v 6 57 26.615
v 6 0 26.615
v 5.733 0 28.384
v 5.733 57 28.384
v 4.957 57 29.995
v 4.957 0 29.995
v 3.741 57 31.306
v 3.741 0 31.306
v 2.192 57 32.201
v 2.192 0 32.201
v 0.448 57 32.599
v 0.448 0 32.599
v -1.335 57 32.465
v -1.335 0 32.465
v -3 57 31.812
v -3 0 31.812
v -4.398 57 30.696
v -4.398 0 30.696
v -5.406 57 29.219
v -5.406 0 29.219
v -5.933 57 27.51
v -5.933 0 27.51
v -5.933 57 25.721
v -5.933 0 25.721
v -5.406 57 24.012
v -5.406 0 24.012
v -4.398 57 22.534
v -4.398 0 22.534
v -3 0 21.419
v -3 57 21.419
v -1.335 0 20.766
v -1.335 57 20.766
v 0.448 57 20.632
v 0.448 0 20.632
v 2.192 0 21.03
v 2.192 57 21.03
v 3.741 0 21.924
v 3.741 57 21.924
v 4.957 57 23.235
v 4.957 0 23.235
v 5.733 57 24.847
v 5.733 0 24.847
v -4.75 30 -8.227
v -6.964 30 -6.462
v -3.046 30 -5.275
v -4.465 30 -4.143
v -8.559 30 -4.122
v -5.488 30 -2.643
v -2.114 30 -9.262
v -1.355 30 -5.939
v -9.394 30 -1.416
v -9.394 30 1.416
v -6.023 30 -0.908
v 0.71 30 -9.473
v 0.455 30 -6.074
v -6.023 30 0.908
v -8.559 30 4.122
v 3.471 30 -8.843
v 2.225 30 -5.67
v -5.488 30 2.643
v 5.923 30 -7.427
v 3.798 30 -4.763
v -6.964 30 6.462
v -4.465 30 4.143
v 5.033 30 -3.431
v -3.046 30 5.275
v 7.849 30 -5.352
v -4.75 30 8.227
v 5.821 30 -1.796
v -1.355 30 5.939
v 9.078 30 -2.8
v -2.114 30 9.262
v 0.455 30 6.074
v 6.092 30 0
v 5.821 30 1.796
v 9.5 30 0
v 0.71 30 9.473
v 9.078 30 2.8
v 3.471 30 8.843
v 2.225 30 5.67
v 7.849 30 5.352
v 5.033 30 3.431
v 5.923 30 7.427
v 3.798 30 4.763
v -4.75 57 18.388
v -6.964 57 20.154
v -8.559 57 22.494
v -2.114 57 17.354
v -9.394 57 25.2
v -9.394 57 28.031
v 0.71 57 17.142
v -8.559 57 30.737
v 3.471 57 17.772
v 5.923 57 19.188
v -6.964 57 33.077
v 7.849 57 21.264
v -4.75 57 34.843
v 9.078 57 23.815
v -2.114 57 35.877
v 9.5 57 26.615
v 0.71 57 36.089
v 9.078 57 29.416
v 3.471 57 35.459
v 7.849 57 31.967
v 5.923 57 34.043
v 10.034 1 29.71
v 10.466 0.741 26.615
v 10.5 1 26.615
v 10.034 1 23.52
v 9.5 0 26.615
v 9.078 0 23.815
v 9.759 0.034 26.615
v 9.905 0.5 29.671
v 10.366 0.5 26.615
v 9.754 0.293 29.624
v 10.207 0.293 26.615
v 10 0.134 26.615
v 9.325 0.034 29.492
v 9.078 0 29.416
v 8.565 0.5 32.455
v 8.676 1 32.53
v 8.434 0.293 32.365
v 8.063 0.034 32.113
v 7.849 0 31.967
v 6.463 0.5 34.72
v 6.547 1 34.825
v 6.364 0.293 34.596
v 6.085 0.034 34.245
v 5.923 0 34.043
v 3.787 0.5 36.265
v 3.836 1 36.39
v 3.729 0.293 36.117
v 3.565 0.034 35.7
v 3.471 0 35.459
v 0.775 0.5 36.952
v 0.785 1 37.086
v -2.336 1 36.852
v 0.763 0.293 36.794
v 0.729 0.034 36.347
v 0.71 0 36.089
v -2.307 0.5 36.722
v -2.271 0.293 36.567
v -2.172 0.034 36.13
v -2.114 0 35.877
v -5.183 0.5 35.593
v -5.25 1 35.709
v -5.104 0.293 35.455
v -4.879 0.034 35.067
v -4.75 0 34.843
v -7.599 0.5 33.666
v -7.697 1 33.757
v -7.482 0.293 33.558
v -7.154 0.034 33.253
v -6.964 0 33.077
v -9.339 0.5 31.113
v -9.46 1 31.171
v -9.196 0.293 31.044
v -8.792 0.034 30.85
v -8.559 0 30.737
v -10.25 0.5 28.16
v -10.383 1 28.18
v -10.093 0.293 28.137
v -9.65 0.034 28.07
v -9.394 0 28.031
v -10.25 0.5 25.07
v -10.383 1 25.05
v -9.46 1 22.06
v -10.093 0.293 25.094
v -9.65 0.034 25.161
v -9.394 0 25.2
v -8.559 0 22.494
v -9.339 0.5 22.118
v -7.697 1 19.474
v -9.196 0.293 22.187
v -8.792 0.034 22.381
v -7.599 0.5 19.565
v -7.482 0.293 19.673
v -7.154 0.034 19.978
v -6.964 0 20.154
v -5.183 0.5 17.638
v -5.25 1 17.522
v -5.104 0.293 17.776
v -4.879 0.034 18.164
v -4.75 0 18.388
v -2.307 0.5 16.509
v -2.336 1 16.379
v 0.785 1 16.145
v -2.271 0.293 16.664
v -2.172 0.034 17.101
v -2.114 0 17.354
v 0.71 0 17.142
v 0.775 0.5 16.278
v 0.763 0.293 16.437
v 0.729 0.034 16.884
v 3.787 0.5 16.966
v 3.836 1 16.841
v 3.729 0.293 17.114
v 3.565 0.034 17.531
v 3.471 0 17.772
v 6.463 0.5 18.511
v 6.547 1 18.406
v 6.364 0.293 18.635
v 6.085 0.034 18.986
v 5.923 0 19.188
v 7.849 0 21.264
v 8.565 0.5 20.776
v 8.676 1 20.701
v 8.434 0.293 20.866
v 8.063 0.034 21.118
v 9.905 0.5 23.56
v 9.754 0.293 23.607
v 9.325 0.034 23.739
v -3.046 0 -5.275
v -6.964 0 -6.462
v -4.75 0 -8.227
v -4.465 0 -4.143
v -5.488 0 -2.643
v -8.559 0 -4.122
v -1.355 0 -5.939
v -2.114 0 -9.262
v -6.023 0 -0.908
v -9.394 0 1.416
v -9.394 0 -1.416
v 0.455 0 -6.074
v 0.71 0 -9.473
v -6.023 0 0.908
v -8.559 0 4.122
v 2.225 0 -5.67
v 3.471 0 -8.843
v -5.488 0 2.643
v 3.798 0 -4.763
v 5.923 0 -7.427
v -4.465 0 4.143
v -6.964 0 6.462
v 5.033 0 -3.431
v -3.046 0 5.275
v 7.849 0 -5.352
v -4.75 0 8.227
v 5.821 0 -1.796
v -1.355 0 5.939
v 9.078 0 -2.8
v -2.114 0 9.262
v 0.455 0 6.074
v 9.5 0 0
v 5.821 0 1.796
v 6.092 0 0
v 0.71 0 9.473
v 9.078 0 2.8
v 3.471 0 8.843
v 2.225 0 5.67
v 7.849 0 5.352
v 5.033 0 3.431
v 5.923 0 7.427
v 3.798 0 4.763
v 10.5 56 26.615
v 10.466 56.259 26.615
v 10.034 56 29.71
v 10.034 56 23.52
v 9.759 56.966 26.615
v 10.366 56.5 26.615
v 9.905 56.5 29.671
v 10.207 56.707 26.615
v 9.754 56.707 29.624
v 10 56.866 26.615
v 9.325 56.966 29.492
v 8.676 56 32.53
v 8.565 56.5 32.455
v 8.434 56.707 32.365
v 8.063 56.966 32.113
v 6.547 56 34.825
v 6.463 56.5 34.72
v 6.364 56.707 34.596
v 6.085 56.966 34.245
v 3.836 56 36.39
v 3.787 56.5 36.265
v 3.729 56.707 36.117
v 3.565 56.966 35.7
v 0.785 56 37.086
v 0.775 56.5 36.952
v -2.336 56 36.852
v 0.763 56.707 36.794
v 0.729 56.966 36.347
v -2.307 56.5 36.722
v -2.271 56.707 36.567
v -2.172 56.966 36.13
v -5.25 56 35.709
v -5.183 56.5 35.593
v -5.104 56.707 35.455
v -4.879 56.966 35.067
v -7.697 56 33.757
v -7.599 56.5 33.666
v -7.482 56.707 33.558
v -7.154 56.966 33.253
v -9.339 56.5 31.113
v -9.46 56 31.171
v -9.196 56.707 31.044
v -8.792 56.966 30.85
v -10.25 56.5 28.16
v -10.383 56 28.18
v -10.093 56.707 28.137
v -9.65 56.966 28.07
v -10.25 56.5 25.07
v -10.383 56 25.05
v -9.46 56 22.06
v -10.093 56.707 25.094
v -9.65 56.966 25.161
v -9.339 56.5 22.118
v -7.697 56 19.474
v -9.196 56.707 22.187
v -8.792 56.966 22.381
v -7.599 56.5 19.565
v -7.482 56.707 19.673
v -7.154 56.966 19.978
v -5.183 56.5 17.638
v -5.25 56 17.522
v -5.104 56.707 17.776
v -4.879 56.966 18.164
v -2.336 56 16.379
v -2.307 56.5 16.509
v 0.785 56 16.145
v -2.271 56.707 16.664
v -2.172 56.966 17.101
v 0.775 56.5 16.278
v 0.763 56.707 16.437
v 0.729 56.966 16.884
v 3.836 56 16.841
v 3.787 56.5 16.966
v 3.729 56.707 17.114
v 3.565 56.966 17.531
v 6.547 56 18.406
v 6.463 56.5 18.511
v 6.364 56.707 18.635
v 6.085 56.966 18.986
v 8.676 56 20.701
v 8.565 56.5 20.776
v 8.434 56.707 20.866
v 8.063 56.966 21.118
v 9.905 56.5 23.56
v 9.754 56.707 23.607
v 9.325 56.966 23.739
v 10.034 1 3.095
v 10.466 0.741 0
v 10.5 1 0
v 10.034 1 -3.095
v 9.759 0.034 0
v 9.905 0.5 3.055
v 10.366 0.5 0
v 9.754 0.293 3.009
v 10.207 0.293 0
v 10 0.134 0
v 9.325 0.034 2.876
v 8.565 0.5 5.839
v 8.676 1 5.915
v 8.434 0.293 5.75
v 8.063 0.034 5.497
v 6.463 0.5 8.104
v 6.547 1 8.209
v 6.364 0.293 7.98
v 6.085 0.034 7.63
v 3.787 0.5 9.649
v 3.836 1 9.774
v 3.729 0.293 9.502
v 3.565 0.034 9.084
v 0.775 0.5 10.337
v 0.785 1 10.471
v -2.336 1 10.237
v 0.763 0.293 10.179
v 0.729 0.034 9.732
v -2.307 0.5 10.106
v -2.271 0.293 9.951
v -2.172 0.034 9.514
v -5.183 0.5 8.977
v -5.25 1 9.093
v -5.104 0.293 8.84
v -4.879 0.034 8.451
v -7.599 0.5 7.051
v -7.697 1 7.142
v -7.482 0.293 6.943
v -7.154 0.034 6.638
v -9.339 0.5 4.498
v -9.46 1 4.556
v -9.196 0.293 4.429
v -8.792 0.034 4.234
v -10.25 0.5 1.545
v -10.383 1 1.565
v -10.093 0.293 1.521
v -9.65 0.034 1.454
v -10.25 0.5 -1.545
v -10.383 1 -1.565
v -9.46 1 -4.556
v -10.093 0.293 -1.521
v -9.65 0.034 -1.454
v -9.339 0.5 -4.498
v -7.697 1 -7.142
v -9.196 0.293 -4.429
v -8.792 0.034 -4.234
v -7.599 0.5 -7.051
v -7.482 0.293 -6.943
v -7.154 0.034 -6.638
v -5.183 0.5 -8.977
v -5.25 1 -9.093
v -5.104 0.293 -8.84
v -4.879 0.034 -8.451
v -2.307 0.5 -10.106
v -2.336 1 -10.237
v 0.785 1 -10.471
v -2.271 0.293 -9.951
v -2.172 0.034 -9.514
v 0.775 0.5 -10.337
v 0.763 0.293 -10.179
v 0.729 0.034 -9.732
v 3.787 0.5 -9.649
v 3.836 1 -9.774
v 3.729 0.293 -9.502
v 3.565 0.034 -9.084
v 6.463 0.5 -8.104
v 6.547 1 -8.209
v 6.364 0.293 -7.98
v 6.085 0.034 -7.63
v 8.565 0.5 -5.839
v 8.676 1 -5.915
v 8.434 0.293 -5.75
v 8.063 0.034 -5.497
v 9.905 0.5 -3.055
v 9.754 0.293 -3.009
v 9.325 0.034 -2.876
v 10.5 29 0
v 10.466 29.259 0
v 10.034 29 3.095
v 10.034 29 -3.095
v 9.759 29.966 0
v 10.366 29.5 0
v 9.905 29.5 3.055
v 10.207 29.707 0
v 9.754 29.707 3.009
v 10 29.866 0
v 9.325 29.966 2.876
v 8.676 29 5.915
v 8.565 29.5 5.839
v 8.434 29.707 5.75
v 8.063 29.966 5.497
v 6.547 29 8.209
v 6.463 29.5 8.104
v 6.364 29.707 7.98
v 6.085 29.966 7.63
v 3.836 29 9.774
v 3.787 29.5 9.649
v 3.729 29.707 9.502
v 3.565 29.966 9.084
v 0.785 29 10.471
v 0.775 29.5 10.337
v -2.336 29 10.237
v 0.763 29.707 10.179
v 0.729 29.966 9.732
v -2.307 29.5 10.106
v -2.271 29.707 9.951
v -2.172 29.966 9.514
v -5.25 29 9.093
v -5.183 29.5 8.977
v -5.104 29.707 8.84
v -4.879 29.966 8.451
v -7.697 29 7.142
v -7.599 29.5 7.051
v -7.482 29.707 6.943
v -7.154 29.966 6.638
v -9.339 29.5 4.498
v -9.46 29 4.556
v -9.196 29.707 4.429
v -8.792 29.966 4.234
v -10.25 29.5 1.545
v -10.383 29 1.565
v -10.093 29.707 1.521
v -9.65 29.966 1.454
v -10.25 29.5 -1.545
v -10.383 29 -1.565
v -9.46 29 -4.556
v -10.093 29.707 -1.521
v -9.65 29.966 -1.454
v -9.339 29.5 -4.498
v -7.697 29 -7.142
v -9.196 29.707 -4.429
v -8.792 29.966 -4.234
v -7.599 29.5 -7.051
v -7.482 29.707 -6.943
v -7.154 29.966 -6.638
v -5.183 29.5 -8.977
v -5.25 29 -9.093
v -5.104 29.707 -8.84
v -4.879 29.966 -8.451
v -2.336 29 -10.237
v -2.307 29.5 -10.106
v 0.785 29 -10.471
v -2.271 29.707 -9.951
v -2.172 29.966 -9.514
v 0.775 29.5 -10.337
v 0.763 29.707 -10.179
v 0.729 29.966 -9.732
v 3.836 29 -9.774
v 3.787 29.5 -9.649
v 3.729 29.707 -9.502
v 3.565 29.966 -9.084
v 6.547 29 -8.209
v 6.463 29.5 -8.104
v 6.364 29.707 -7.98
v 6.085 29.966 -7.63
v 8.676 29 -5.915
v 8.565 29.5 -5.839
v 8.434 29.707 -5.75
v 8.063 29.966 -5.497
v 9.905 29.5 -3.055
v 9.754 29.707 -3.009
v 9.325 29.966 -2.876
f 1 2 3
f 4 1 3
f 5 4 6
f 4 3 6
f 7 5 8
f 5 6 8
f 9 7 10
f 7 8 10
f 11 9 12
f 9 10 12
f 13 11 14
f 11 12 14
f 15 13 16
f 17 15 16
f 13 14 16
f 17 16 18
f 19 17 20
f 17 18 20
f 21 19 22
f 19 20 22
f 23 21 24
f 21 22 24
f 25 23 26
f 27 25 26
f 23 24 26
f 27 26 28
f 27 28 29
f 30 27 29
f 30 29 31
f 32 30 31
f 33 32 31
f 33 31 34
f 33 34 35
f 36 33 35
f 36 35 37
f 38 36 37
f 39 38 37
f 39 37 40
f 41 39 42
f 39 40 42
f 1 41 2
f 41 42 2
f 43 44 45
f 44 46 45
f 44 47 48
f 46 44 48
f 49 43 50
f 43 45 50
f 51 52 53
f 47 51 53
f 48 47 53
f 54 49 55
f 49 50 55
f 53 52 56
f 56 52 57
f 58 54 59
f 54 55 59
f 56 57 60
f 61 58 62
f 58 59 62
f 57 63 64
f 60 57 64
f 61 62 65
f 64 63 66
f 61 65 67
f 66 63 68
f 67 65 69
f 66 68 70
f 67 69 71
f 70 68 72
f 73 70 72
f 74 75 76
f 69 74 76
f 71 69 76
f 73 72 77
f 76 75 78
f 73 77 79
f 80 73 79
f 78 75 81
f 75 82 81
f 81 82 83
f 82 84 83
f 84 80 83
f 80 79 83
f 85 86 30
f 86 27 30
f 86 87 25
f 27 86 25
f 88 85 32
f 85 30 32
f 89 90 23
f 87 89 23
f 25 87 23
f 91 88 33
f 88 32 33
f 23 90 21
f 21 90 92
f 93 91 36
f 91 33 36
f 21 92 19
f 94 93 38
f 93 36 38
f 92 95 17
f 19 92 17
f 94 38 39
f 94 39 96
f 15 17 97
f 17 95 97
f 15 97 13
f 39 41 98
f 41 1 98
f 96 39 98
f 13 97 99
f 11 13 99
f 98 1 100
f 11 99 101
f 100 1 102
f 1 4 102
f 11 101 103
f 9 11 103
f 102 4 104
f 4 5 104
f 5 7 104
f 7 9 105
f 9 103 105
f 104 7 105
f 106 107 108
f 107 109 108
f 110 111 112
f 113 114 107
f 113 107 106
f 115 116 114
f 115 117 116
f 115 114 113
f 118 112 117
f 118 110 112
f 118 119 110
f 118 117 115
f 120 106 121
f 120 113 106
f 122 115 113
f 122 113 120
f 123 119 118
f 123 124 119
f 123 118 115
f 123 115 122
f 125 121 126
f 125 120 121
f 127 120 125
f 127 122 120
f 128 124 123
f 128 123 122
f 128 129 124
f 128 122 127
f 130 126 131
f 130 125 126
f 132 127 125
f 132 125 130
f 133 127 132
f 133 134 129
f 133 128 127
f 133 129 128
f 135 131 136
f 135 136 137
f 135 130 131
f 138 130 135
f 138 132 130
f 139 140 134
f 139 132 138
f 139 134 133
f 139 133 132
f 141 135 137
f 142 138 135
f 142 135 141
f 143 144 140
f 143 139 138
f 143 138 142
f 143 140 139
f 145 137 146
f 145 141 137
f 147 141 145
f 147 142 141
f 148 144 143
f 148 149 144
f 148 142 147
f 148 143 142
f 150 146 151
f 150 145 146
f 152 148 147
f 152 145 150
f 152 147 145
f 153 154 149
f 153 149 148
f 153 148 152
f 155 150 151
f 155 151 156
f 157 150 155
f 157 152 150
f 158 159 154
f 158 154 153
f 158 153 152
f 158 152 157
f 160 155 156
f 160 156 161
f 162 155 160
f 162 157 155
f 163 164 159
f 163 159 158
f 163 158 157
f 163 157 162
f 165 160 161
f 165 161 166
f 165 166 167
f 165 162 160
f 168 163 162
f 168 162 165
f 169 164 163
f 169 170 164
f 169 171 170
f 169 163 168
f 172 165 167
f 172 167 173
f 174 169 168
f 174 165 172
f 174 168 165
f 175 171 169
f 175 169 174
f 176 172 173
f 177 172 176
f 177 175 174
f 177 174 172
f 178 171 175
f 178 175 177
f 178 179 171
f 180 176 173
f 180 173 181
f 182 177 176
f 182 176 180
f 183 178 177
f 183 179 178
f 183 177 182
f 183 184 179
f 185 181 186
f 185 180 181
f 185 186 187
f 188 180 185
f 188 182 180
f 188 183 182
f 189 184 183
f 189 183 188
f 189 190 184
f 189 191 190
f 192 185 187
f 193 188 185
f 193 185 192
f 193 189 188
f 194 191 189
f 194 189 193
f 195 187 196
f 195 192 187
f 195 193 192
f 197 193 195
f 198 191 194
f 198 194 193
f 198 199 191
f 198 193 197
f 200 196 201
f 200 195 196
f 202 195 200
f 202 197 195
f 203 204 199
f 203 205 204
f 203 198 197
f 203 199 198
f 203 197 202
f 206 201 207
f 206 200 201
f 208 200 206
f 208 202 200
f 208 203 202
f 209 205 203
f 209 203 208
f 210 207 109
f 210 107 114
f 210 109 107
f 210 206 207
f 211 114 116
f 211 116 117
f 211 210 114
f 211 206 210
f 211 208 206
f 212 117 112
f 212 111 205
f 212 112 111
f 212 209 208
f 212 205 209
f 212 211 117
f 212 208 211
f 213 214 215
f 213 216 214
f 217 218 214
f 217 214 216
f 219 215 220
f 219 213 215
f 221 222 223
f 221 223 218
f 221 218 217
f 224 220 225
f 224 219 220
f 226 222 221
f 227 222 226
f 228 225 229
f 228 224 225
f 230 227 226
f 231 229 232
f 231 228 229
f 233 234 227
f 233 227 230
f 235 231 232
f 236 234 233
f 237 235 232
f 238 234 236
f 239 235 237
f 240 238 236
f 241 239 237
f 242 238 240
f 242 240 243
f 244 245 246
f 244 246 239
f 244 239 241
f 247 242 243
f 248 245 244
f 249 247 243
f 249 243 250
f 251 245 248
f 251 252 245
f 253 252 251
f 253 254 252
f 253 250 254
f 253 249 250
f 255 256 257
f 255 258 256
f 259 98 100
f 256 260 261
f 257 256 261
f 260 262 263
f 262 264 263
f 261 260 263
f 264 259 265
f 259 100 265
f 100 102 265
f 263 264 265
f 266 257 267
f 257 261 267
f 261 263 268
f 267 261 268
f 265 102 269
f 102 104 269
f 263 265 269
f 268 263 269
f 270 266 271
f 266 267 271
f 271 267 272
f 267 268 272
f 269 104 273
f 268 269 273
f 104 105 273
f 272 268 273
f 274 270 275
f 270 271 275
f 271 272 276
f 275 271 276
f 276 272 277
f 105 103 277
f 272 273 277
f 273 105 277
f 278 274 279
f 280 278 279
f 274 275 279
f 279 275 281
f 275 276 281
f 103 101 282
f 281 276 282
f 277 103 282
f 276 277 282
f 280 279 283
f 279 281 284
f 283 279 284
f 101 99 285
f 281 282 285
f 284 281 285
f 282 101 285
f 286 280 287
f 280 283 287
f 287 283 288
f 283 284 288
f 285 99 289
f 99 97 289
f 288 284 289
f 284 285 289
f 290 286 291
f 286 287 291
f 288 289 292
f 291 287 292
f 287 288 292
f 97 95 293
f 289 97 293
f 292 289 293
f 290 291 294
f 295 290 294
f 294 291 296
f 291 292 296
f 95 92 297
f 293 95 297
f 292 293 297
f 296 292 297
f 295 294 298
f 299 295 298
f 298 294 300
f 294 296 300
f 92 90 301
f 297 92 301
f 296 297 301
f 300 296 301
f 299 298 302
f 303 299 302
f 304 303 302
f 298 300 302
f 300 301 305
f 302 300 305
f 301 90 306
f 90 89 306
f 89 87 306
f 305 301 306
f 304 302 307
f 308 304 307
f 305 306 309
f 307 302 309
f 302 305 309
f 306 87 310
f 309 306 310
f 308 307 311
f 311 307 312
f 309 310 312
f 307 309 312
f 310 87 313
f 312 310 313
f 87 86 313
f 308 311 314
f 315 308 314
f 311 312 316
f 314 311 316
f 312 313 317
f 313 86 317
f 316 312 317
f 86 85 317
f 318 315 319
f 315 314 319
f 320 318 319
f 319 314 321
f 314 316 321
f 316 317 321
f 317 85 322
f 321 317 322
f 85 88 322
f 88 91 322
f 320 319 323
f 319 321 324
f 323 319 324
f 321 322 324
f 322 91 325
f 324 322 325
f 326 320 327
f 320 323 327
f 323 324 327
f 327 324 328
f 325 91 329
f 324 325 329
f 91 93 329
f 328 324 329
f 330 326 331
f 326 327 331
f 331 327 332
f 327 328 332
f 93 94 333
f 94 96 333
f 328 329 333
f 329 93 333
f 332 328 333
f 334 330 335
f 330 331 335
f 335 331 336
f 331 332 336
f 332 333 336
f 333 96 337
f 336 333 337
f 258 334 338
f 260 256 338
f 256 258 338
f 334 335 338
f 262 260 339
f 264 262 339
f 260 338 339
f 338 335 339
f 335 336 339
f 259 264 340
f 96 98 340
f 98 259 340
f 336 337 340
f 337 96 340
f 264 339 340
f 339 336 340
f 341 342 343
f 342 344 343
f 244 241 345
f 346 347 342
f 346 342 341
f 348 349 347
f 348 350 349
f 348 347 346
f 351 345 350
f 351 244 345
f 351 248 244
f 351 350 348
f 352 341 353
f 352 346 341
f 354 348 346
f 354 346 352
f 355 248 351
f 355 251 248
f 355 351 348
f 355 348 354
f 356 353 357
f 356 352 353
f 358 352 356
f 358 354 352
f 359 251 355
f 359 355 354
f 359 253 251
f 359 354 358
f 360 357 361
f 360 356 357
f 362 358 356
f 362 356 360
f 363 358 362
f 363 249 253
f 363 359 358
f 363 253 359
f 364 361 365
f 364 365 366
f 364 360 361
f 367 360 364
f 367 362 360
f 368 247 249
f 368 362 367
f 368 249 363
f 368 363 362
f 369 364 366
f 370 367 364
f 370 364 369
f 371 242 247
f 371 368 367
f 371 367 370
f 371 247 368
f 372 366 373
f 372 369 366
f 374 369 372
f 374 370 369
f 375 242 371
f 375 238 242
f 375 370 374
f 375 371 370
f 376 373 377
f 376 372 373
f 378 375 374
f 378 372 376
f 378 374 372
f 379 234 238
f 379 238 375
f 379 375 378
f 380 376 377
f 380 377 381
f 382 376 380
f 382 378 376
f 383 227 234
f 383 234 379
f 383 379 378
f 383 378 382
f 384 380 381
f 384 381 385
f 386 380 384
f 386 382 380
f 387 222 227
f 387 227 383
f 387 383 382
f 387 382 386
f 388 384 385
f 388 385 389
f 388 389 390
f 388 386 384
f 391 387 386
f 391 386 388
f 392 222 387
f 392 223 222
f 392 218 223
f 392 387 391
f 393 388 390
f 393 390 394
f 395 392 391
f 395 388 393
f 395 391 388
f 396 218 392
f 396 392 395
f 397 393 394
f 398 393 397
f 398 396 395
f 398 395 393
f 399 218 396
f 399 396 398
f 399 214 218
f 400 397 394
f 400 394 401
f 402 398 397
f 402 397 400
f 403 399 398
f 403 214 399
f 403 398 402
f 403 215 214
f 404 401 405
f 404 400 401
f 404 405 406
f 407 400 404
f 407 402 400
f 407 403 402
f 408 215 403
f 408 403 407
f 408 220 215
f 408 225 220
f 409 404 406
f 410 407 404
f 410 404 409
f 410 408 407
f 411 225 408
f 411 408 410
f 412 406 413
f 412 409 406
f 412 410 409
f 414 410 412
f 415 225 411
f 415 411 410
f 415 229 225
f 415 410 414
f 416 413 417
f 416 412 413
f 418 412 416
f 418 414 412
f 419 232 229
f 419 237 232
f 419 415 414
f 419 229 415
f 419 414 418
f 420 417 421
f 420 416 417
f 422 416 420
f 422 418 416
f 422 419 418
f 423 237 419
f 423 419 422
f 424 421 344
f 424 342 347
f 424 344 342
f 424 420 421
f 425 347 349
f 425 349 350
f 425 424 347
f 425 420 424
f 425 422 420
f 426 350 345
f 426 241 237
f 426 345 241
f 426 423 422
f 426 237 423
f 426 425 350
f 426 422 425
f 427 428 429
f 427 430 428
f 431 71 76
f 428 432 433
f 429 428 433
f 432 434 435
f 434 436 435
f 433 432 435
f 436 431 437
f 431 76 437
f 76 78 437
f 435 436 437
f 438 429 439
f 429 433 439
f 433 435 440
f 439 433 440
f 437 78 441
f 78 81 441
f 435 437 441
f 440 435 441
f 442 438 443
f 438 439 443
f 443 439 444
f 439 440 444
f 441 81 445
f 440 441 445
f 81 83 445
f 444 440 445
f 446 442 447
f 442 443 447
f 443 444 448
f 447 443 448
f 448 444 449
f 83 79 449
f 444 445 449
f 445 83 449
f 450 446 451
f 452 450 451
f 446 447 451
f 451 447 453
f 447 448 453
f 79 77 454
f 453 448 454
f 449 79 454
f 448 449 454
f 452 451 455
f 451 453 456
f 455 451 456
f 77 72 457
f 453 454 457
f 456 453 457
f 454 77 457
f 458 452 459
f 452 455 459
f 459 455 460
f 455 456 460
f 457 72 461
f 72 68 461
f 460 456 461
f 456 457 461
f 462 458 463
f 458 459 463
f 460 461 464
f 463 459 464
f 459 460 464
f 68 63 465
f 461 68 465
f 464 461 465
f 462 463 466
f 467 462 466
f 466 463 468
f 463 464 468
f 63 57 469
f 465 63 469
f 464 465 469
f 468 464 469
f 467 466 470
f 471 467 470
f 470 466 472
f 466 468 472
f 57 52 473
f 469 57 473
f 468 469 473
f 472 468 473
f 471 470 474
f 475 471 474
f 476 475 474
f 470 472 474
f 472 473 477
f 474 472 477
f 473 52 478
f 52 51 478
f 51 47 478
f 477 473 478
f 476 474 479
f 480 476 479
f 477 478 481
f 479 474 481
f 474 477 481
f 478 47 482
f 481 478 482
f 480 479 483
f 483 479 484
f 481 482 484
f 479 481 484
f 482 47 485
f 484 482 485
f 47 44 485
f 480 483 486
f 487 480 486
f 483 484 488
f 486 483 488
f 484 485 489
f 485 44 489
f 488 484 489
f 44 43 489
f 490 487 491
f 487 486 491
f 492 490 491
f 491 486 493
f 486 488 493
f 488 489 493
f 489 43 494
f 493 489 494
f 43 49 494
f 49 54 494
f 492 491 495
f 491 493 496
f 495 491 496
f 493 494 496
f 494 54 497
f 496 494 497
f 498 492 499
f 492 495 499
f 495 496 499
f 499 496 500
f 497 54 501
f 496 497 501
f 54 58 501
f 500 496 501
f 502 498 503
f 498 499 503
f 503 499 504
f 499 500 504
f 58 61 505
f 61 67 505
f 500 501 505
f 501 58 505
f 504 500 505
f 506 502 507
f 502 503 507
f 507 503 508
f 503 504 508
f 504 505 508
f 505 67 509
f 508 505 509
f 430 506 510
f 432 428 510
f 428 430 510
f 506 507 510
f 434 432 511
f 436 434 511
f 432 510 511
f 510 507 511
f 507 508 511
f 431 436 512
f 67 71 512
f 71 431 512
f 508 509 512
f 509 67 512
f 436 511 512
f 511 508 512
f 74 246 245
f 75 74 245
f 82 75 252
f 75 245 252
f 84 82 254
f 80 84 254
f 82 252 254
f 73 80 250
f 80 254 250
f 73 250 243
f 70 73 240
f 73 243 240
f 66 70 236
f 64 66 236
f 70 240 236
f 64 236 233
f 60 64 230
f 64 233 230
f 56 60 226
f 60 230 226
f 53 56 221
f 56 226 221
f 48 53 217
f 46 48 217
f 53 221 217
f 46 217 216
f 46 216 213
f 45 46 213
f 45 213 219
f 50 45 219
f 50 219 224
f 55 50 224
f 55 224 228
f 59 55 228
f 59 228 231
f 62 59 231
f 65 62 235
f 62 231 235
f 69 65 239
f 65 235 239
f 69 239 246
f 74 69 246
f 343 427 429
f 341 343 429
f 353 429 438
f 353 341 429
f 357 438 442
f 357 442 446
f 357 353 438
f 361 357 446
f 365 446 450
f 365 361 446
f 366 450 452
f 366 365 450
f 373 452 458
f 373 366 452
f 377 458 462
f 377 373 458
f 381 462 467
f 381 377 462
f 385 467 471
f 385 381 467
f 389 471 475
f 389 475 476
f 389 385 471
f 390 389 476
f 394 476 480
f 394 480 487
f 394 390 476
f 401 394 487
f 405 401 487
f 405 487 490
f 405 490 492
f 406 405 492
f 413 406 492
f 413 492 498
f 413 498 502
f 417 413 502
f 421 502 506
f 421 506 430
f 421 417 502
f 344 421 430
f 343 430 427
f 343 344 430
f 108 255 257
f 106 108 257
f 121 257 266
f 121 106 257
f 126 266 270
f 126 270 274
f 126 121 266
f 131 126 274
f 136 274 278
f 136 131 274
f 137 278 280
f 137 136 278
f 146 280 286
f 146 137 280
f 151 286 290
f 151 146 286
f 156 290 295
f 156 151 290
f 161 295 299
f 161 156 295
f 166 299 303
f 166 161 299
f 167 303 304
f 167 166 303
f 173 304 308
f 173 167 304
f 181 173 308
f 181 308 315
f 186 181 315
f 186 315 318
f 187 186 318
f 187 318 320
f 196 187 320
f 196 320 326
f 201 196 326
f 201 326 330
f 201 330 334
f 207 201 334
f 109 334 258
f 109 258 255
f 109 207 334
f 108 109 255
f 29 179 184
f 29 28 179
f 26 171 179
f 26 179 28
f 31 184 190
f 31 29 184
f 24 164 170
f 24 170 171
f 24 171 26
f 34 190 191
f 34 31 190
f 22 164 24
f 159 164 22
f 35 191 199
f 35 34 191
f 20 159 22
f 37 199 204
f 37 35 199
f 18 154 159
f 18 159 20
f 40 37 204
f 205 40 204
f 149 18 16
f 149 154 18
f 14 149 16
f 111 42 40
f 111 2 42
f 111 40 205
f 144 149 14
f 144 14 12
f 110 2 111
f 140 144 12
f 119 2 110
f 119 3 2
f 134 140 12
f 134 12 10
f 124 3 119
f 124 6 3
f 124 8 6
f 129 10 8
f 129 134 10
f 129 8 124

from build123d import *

# Parameters (mm, degrees)
F0_R     = 10.5
F0_R_2   = 6.0915
F1_DEPTH = 30
F2_R     = 10.5
F2_R_2   = 6
F3_DEPTH = 57
F4_R     = 1
F4_2_R   = 1


with BuildPart() as f1:
    # F0 (on Front) → F1 (new body)
    with BuildSketch(Plane.XZ):
        Circle(F0_R)
        Circle(F0_R_2, mode=Mode.SUBTRACT)
    extrude(amount=-F1_DEPTH)

    # F4#2
    f4_2_edges = [f1.edges().sort_by_distance(p)[0] for p in [
        (-10.5, 0, 0),
        (-10.5, 30, 0),
    ]]
    fillet(f4_2_edges, radius=F4_2_R)


with BuildPart() as f3:
    # F2 (on Front) → F3 (new body)
    with BuildSketch(Plane.XZ):
        with Locations((0, 26.615409)):
            Circle(F2_R)
        with Locations((0, 26.615409)):
            Circle(F2_R_2, mode=Mode.SUBTRACT)
    extrude(amount=-F3_DEPTH)

    # F4
    f4_edges = [f3.edges().sort_by_distance(p)[0] for p in [
        (-10.5, 0, 26.615409),
        (-10.5, 57, 26.615409),
    ]]
    fillet(f4_edges, radius=F4_R)


solid = Compound([f1.part, f3.part])
